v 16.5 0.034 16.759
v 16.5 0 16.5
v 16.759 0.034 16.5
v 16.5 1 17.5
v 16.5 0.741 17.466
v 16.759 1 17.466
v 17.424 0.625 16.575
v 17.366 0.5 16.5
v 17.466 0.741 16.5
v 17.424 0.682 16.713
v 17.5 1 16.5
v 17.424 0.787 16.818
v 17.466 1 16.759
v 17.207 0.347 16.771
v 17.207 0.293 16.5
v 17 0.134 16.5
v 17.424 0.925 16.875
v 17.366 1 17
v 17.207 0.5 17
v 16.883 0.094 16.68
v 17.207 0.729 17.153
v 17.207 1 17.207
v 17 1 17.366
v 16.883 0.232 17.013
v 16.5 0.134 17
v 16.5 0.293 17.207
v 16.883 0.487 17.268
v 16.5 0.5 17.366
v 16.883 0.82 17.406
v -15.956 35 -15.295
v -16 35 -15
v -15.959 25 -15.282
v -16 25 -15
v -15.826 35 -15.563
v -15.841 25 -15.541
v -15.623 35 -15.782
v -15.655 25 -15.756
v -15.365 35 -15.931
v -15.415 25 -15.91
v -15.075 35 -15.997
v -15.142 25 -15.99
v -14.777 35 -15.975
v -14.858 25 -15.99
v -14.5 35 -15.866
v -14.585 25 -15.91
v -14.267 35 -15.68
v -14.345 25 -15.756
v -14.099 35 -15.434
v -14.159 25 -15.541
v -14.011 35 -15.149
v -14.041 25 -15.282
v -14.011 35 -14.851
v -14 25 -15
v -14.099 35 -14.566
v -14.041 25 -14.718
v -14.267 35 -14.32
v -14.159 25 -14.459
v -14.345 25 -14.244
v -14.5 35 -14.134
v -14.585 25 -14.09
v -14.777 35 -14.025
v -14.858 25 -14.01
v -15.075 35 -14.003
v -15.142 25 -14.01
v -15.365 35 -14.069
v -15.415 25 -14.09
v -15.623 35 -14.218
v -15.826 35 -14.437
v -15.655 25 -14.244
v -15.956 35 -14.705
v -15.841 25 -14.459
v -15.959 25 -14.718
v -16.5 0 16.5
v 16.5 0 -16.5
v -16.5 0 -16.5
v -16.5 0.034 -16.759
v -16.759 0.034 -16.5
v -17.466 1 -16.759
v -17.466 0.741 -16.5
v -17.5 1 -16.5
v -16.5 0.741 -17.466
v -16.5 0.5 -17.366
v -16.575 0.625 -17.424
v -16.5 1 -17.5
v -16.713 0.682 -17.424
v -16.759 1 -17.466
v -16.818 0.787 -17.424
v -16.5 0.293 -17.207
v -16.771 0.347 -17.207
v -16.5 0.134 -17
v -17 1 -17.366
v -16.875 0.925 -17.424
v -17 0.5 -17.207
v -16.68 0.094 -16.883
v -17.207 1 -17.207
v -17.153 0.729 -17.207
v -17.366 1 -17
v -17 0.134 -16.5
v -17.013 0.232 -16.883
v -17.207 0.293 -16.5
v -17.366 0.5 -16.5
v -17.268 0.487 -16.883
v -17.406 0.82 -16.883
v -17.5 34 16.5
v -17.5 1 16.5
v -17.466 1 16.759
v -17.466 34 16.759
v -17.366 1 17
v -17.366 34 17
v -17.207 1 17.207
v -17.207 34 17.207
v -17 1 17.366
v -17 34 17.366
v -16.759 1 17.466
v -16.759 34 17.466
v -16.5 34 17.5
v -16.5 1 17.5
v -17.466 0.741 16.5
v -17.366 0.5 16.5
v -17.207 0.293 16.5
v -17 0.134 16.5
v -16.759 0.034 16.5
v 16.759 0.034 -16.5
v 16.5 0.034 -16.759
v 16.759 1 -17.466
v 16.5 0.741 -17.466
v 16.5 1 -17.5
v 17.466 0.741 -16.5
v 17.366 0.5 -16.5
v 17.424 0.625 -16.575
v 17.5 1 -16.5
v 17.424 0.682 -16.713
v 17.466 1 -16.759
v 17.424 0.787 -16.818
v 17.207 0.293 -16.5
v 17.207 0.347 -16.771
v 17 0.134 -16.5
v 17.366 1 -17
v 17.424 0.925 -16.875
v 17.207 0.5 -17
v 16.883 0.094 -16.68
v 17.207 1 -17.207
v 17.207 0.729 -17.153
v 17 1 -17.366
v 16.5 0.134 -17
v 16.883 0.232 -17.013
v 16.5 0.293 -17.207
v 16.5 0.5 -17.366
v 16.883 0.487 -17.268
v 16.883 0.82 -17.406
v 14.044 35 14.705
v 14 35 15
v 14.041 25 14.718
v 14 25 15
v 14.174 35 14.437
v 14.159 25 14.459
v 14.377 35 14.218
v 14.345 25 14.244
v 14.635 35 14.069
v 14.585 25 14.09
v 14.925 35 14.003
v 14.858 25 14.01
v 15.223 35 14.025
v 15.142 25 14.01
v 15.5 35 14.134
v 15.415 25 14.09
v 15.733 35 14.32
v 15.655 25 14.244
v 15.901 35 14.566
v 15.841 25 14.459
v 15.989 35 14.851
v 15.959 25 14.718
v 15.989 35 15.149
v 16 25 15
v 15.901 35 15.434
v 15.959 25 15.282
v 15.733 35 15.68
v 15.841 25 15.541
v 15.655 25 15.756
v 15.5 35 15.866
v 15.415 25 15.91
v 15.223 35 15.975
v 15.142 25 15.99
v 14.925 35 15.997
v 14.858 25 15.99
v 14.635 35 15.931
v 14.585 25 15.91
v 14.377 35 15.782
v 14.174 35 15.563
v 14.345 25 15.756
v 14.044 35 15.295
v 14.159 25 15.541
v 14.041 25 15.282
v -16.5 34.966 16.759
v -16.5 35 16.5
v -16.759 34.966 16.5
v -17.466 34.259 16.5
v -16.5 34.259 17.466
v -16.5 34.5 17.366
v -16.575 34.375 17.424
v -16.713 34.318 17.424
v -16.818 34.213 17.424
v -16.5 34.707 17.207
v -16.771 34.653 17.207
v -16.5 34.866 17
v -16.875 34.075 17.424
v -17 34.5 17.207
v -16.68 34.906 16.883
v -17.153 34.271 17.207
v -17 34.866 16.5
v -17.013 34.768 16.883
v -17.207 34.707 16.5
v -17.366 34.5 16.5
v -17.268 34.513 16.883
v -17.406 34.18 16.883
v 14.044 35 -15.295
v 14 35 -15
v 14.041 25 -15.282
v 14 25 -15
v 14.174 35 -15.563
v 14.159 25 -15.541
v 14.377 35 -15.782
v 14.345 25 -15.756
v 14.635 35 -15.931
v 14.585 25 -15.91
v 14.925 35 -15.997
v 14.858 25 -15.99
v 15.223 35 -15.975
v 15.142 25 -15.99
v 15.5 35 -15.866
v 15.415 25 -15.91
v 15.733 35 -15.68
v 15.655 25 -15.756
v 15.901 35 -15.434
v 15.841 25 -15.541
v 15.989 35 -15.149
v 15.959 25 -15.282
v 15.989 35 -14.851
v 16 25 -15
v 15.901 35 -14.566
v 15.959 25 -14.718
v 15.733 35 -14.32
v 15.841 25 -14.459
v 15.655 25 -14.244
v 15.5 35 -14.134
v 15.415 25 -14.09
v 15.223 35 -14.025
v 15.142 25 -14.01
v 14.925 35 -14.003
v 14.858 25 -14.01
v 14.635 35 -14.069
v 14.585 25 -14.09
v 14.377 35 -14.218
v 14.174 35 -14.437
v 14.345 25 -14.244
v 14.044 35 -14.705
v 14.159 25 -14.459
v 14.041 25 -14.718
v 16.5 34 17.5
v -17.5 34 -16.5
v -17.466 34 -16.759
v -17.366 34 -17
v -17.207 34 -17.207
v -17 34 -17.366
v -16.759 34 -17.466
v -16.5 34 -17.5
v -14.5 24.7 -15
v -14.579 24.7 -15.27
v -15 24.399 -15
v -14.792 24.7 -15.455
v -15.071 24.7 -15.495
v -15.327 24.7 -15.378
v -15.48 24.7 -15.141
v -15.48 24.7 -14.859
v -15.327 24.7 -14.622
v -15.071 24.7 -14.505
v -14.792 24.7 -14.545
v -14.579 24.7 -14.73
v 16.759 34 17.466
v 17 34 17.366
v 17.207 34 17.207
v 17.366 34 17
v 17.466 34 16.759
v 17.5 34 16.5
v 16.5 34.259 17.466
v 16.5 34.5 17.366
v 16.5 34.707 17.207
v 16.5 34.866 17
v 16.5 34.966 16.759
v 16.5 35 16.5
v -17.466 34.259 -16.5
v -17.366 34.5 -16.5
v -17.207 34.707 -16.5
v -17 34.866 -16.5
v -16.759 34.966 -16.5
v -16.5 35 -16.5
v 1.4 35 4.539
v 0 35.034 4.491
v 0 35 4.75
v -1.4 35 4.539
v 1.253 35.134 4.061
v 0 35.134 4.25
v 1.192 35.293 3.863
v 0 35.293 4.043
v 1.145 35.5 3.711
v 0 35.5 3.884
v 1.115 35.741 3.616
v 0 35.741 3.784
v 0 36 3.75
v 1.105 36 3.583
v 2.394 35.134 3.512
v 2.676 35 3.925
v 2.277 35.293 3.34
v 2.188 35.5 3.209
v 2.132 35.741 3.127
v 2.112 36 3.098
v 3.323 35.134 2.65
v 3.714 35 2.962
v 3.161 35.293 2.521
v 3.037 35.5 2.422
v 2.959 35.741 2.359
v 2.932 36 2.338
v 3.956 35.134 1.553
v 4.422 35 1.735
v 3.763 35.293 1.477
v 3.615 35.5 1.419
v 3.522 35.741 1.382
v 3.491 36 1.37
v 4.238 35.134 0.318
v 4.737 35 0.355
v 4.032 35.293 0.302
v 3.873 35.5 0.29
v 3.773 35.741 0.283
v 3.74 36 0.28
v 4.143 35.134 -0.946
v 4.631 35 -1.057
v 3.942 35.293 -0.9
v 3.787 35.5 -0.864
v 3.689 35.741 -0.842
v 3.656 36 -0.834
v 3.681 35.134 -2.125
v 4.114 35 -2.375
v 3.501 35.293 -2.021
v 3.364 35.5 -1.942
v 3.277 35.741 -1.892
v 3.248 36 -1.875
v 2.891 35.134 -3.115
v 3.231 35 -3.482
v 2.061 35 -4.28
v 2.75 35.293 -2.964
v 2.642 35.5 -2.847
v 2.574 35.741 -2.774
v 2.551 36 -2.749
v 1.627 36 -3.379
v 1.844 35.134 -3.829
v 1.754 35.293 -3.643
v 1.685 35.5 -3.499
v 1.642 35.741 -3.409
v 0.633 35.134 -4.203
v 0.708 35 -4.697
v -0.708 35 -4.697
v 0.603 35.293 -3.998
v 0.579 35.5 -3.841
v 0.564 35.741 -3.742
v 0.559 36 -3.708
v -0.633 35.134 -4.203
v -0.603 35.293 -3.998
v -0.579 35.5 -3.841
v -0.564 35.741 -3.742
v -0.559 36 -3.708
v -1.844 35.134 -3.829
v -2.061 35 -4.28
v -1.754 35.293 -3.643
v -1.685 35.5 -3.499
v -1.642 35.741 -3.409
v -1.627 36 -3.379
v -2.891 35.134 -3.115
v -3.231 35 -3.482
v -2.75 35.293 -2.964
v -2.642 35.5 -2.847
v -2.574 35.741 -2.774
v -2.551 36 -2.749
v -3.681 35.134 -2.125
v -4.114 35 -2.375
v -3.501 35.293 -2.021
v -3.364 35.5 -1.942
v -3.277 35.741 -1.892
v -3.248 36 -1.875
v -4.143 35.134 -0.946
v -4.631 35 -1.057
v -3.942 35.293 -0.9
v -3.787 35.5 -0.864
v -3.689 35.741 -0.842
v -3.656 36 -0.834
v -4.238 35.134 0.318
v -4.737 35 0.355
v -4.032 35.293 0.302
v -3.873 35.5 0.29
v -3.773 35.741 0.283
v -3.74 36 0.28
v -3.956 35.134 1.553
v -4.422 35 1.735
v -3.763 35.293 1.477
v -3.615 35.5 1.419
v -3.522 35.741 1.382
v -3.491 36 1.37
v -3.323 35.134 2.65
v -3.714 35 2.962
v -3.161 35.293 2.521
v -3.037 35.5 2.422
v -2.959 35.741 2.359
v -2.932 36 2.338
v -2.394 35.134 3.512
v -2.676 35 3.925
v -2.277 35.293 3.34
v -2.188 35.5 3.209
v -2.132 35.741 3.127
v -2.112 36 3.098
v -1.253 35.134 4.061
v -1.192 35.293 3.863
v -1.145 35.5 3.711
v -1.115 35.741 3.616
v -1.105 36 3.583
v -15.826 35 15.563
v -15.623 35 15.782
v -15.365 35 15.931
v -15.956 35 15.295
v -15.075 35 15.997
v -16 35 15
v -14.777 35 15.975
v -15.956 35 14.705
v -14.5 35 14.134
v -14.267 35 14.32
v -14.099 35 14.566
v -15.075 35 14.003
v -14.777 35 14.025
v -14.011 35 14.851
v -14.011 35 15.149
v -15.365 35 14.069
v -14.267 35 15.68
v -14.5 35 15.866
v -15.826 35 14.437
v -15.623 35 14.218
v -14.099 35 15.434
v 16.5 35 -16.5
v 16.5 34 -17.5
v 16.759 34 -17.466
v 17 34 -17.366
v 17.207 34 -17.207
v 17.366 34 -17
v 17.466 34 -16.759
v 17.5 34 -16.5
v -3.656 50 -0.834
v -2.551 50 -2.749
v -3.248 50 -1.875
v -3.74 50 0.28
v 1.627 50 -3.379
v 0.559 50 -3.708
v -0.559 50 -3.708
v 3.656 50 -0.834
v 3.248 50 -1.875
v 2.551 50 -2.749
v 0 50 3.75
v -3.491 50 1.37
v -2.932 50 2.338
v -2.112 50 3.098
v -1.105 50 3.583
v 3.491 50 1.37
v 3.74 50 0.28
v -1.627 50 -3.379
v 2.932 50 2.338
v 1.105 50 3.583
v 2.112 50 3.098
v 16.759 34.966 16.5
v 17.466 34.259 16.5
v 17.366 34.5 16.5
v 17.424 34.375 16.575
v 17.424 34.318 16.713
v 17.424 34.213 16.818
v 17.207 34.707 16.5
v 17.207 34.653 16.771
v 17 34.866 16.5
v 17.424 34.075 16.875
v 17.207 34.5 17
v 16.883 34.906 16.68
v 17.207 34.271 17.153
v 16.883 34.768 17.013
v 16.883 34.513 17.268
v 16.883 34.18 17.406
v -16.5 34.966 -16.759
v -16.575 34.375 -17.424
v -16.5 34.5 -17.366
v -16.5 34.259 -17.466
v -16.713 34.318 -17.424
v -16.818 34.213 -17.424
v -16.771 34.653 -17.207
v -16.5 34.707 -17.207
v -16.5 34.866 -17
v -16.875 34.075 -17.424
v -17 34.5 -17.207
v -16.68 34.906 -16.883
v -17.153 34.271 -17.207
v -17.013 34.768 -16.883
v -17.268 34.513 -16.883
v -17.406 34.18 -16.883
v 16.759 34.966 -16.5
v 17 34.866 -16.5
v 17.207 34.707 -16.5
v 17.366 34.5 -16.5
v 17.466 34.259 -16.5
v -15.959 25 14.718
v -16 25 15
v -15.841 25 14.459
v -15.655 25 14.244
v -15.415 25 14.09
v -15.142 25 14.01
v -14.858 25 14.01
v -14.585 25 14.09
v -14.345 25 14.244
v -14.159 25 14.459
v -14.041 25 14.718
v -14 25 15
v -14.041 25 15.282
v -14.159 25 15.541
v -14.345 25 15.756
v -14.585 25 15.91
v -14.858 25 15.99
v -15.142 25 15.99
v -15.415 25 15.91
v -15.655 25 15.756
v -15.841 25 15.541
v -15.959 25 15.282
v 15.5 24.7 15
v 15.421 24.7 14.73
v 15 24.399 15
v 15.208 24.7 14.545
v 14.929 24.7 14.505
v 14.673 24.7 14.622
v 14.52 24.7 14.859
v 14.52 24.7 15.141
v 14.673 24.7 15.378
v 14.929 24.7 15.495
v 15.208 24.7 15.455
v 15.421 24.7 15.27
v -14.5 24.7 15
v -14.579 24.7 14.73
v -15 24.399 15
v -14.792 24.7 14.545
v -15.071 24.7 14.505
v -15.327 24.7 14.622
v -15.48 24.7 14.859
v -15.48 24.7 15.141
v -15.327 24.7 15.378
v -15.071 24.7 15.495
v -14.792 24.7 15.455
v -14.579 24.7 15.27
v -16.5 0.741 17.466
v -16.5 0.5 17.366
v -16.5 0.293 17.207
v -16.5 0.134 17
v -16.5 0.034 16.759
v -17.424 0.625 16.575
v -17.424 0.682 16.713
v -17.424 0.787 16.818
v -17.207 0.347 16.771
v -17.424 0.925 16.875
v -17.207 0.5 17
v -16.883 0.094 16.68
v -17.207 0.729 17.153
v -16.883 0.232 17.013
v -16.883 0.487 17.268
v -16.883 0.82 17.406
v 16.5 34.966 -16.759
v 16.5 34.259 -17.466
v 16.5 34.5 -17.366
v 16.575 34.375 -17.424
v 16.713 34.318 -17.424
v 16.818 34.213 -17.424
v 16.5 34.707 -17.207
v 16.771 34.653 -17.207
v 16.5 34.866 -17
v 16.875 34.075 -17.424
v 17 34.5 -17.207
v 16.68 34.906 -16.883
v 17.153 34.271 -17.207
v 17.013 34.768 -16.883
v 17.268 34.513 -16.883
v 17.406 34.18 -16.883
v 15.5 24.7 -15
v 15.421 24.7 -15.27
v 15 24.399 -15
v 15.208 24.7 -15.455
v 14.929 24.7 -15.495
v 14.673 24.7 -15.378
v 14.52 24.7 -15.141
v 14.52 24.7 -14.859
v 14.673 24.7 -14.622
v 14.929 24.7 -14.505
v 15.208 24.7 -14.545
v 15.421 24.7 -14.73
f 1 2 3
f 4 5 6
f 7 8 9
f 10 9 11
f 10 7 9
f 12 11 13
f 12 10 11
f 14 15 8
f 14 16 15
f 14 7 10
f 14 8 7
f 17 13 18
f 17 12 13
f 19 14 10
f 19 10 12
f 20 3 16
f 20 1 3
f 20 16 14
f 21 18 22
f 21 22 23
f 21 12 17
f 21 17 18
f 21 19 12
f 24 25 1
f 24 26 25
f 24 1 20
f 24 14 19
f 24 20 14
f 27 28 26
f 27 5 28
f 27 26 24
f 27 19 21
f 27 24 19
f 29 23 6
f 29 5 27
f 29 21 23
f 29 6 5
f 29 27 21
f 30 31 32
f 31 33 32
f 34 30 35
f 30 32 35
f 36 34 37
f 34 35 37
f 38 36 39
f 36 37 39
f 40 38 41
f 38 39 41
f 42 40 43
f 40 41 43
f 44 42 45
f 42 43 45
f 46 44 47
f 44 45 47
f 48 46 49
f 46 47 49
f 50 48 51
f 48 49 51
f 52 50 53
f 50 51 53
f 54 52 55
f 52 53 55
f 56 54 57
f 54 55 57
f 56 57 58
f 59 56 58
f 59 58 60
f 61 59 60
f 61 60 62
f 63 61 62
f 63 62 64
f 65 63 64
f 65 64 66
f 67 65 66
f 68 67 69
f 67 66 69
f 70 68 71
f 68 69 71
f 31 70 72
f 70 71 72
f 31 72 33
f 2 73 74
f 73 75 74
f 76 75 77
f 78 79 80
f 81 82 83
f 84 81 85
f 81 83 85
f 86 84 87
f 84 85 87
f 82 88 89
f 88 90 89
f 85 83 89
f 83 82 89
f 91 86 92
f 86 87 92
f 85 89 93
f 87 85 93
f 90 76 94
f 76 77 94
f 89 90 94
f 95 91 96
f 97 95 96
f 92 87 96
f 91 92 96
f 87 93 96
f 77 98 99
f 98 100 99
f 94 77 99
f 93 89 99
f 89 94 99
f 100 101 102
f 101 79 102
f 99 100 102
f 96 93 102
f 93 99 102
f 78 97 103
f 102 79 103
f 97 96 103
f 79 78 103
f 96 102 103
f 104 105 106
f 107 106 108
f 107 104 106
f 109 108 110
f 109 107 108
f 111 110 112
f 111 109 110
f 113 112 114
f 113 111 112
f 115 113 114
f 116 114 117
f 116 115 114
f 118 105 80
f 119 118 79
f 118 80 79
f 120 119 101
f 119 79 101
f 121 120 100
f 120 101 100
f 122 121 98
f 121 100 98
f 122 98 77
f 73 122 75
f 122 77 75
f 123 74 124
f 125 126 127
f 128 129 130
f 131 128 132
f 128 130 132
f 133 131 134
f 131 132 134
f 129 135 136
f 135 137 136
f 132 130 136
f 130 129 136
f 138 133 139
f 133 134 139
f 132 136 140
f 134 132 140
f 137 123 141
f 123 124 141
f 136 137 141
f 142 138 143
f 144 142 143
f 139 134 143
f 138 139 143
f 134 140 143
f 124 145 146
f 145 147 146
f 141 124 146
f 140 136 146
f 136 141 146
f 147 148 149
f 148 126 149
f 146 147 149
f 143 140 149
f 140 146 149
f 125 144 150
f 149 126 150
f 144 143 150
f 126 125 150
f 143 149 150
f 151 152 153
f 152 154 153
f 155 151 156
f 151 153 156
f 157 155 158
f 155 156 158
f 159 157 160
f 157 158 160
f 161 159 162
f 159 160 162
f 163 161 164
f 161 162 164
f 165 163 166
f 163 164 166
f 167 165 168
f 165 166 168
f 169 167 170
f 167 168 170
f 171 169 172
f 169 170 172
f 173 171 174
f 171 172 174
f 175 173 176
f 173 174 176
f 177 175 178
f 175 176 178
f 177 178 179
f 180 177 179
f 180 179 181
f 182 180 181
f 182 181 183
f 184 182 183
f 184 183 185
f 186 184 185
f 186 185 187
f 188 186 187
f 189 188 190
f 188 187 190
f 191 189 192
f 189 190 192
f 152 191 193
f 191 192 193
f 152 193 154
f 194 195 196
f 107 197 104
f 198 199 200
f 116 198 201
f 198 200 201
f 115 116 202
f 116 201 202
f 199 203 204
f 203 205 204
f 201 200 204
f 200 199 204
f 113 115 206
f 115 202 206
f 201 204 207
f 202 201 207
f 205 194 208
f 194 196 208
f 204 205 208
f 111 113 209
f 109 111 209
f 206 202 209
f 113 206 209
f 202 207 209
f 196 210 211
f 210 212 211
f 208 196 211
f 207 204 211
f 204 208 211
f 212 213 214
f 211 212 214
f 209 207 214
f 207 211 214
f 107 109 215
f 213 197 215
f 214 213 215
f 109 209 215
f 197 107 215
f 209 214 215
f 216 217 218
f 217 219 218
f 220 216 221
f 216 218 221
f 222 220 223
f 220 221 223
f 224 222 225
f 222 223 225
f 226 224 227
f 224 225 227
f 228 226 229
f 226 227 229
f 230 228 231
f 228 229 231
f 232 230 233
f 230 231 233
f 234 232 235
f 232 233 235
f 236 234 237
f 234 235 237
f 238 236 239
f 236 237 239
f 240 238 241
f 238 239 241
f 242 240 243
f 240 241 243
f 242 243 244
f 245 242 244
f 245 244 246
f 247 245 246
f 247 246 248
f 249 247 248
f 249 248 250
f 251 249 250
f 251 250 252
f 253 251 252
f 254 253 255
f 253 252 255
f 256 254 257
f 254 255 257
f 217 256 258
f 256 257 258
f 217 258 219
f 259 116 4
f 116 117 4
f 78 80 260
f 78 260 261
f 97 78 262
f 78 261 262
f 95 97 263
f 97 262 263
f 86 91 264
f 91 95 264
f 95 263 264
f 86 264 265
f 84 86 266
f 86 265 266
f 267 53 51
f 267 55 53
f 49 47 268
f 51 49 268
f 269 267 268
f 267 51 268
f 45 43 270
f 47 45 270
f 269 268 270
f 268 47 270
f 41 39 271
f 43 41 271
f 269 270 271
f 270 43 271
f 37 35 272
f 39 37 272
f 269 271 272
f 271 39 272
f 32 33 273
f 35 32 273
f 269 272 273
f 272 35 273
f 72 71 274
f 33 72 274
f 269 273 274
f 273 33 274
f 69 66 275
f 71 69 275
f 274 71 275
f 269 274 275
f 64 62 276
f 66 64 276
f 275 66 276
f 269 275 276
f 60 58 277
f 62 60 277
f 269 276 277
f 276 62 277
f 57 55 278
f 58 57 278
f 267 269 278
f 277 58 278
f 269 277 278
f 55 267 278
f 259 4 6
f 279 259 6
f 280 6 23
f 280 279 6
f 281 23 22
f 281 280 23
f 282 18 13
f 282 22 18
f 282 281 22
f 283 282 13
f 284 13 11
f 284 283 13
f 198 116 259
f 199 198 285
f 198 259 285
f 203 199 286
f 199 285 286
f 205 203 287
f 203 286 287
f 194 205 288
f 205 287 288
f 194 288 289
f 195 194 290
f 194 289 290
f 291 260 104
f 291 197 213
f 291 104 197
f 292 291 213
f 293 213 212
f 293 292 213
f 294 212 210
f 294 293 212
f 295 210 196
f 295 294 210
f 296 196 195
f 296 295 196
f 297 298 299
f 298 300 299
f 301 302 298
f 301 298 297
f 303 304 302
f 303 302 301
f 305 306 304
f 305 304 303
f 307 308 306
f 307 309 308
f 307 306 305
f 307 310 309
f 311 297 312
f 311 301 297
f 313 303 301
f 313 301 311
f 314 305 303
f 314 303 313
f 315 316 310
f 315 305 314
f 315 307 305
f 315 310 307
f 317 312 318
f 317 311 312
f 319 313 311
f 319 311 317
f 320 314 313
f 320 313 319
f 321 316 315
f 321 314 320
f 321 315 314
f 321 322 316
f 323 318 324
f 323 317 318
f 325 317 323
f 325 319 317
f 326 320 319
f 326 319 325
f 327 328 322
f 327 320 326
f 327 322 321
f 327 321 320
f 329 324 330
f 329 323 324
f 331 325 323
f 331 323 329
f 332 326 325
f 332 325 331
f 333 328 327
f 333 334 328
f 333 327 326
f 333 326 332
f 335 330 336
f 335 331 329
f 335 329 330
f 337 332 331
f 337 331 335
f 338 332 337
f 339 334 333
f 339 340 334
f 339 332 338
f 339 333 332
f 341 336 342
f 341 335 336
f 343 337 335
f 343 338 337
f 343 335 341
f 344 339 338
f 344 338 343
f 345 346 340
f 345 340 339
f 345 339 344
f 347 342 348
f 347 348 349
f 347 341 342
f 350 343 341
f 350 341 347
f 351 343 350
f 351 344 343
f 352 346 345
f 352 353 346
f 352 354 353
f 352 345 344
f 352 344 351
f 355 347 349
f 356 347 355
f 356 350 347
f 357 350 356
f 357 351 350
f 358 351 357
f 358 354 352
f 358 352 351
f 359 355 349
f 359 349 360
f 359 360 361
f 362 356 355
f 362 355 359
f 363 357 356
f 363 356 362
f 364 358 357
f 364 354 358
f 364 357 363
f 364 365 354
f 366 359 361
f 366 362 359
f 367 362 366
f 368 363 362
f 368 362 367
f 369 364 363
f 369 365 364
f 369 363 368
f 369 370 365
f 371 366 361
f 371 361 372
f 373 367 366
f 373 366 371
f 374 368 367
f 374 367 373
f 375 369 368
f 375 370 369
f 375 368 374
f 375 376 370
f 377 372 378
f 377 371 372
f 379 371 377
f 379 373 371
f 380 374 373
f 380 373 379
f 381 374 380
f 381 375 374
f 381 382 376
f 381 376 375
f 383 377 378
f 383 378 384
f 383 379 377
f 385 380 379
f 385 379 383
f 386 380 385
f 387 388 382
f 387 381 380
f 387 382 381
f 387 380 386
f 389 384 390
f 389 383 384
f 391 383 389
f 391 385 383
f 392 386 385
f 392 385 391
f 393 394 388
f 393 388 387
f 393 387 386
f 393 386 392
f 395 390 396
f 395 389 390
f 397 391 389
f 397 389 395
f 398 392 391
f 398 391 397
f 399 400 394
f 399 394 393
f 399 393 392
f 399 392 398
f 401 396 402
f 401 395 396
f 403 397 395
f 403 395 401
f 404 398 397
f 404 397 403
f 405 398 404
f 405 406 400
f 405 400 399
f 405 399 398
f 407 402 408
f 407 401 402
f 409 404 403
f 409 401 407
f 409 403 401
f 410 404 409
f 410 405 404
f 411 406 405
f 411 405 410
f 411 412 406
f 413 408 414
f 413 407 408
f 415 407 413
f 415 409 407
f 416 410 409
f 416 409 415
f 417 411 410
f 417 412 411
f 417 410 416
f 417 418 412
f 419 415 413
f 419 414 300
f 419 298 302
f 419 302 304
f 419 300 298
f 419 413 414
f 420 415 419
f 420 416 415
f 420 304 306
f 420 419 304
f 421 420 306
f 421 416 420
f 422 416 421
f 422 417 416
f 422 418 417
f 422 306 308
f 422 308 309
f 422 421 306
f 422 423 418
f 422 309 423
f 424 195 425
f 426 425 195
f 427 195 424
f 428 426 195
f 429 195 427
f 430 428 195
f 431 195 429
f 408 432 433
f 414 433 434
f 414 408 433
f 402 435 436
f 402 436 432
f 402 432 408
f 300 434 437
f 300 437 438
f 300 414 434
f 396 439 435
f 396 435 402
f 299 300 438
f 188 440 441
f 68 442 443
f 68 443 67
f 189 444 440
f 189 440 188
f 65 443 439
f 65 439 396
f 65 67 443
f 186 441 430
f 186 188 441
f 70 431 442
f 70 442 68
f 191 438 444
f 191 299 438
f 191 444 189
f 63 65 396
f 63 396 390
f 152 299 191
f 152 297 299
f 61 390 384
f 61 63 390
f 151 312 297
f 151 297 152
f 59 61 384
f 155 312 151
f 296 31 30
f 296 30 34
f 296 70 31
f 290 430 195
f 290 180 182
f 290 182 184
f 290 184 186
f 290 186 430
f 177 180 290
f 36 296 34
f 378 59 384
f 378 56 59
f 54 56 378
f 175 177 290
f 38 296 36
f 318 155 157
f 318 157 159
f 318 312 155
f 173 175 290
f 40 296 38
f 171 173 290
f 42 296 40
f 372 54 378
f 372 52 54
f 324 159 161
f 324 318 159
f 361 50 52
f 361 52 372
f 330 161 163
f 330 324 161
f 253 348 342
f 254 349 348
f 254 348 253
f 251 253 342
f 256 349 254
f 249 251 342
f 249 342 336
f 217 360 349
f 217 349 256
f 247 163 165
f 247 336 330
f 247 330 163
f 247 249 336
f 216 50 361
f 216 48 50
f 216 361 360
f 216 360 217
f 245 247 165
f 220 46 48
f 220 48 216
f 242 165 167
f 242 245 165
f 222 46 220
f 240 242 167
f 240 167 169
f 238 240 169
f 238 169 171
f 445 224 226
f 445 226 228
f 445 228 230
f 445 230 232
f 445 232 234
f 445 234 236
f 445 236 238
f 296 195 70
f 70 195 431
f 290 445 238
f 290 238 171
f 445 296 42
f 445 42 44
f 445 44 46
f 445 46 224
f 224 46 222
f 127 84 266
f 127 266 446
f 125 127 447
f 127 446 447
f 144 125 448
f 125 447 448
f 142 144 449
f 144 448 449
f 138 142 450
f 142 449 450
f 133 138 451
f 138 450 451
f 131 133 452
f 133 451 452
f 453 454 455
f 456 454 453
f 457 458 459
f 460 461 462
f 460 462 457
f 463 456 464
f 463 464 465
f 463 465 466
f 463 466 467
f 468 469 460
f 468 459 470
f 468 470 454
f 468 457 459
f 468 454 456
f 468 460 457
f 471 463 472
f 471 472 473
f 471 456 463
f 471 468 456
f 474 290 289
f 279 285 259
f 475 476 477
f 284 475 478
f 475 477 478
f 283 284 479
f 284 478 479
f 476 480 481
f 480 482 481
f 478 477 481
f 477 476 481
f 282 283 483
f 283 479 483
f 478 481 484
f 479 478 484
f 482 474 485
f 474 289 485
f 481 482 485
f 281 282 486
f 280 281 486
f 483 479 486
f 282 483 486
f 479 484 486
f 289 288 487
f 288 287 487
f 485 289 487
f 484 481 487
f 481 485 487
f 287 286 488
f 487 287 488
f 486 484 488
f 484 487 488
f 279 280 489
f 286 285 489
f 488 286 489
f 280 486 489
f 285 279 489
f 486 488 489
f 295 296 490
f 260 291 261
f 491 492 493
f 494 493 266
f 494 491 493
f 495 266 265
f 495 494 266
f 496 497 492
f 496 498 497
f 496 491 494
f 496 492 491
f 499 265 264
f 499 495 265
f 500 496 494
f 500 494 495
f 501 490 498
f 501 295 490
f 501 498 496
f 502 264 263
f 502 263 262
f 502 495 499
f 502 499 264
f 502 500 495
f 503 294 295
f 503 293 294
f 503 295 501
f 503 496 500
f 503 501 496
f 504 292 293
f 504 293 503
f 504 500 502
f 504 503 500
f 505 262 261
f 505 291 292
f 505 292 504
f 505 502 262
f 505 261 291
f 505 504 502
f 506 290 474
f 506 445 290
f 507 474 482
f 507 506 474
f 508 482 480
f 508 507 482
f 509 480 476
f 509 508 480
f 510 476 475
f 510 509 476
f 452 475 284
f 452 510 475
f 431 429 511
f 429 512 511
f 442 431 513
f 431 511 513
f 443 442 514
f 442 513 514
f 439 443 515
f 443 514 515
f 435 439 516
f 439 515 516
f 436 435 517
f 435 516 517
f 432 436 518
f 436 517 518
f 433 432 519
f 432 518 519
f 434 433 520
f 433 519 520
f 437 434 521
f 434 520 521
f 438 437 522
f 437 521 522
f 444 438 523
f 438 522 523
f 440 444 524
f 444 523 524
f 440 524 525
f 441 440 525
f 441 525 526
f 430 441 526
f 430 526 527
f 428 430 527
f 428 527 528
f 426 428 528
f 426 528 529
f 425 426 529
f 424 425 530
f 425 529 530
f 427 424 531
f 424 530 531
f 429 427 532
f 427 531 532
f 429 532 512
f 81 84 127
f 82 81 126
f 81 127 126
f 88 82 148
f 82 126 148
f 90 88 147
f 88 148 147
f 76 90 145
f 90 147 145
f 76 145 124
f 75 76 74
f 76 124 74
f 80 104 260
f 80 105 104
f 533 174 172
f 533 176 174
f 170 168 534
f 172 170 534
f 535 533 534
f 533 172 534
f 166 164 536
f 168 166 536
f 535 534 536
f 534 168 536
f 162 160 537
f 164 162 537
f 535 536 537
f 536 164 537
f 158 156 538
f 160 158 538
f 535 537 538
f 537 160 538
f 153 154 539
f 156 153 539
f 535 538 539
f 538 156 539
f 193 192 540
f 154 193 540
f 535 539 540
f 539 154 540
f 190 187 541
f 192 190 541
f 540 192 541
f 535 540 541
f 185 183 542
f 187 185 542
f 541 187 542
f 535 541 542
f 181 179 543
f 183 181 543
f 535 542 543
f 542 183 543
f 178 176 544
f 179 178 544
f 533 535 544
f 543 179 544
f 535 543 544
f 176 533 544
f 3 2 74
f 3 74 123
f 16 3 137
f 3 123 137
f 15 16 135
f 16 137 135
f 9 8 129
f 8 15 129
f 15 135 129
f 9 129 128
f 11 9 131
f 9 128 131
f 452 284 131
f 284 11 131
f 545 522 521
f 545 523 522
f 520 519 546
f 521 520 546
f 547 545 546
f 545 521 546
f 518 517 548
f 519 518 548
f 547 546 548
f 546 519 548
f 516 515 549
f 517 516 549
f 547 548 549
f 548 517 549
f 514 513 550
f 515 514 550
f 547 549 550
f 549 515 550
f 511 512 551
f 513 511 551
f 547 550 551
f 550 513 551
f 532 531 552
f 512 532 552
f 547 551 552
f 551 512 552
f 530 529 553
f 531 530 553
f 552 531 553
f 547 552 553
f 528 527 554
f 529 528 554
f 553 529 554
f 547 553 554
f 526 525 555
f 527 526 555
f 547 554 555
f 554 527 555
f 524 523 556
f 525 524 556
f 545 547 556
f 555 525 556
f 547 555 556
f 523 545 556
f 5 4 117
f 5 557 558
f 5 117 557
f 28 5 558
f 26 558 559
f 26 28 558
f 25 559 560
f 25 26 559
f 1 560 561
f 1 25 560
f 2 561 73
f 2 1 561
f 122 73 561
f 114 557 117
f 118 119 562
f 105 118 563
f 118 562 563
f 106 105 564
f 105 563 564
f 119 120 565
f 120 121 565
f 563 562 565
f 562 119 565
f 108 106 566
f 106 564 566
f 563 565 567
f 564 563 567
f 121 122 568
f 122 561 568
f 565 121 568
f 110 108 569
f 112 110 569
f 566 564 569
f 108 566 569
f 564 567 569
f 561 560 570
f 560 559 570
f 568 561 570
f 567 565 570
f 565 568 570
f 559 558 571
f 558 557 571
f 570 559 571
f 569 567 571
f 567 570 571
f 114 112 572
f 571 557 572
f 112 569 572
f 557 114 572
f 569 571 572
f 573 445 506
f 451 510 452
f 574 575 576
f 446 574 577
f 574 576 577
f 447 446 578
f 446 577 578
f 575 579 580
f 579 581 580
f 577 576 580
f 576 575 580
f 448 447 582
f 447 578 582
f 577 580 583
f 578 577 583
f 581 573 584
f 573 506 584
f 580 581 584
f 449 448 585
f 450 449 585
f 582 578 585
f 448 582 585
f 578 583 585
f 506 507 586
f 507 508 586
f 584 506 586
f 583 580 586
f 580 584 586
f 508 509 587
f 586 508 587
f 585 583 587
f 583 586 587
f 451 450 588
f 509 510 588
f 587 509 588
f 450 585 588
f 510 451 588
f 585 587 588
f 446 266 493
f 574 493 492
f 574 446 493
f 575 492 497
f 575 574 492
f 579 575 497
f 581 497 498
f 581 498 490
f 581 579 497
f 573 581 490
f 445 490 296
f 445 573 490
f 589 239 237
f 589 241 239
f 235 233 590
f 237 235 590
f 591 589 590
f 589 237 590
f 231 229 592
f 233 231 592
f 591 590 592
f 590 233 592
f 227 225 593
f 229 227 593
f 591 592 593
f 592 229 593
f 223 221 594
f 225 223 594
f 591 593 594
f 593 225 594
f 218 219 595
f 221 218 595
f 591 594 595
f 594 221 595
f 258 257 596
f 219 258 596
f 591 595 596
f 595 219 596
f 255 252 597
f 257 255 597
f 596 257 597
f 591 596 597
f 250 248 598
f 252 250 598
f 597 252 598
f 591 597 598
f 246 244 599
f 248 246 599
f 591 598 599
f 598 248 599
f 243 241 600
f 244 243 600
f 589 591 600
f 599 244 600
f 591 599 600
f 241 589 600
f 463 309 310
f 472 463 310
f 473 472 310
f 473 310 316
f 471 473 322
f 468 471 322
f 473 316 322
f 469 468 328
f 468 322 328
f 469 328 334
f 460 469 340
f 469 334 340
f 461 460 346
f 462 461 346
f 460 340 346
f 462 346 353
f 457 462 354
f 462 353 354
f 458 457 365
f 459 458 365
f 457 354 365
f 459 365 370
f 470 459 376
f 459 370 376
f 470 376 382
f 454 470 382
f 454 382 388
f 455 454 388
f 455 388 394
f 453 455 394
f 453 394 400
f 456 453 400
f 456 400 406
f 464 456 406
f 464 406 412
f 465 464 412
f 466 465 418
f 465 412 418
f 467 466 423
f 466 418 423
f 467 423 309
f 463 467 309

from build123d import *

# Parameters (mm, degrees)
SKETCH1_W                 = 35
SKETCH1_H                 = 35
BOSS_EXTRUDE1_DEPTH       = 35
SKETCH2_R                 = 3.75
BOSS_EXTRUDE2_DEPTH       = 15
FILLET1_R                 = 1
F_2_0MM_DOWEL_HOLE1_D     = 2
F_2_0MM_DOWEL_HOLE1_DEPTH = 10
F_2_0MM_DOWEL_HOLE1_TIP   = 0.600860619


with BuildPart() as part:
    # Sketch1 → Boss-Extrude1 (new body)
    with BuildSketch(Plane(origin=(0, 0, 0), x_dir=(1, 0, 0), z_dir=(0, 1, 0))):
        Rectangle(SKETCH1_W, SKETCH1_H)
    extrude(amount=BOSS_EXTRUDE1_DEPTH)

    # Sketch2 → Boss-Extrude2 (add)
    with BuildSketch(Plane(origin=(0, 35, 0), x_dir=(1, 0, 0), z_dir=(0, 1, 0))):
        with Locations(Location((0, 0, 0), (0, 0, 270))):
            Circle(SKETCH2_R)
    extrude(amount=BOSS_EXTRUDE2_DEPTH)

    # Fillet1
    fillet1_edges = [part.edges().sort_by_distance(p)[0] for p in [
        (-17.5, 35, 0),
        (0, 35, 17.5),
        (0, 35, -3.75),
        (17.5, 35, 0),
        (0, 0, 17.5),
        (-17.5, 0, 0),
        (0, 0, -17.5),
        (17.5, 0, 0),
        (0, 35, -17.5),
        (17.5, 17.5, 17.5),
        (-17.5, 17.5, 17.5),
        (-17.5, 17.5, -17.5),
        (17.5, 17.5, -17.5),
    ]]
    fillet(fillet1_edges, radius=FILLET1_R)

    # Ø2.0mm Dowel Hole1
    with Locations(Plane(origin=(0, 35, 0), x_dir=(1, 0, 0), z_dir=(0, 1, 0))):
        with Locations((-15, 15), (15, 15), (15, -15), (-15, -15)):
            Hole(F_2_0MM_DOWEL_HOLE1_D / 2, depth=F_2_0MM_DOWEL_HOLE1_DEPTH)
            with Locations((0, 0, -(F_2_0MM_DOWEL_HOLE1_DEPTH + F_2_0MM_DOWEL_HOLE1_TIP / 2))):  # 118° drill point
                Cone(0, F_2_0MM_DOWEL_HOLE1_D / 2, F_2_0MM_DOWEL_HOLE1_TIP, mode=Mode.SUBTRACT)


solid = part.part
